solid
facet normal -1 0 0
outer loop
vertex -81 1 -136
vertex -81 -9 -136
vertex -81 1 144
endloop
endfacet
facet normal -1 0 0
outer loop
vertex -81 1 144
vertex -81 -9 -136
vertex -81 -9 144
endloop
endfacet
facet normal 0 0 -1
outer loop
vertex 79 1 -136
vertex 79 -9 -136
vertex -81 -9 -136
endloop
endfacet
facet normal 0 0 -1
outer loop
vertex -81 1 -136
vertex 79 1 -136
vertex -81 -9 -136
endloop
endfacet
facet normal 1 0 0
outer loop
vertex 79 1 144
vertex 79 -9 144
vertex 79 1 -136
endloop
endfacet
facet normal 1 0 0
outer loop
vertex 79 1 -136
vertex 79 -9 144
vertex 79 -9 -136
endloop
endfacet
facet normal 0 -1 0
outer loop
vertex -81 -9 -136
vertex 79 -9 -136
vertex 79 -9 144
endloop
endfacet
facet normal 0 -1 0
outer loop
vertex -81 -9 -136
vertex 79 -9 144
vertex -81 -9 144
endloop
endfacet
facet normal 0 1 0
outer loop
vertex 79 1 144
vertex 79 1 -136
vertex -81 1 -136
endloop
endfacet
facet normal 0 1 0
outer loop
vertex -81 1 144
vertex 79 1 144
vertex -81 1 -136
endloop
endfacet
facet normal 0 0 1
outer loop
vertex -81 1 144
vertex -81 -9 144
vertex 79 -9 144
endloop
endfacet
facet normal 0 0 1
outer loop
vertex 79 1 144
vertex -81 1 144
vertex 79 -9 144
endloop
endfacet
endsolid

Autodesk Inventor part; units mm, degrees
ref_plane "YZ Plane" through (0, 0, 0) normal (1, 0, 0) x (0, 1, 0)
ref_plane "XZ Plane" through (0, 0, 0) normal (0, 1, 0) x (-1, 0, 0)
ref_plane "XY Plane" through (0, 0, 0) normal (0, 0, 1) x (1, 0, 0)
sketch "Sketch1" plane through (0, 0, 0) normal (0, 1, 0) x (-1, 0, 0)
  line L0 (9, 18) -> (-7, 18)
  line L1 (-7, 18) -> (-7, -10)
  line L2 (-7, -10) -> (9, -10)
  line L3 (9, -10) -> (9, 18)
  point P0 (0, 0)
extrude "Extrusion1" add sketch "Sketch1" along normal blind 1
sketch "Sketch2" plane through (0, 1, 0) normal (0, 1, 0) x (1, 0, 0)
  point P0 (0, 0)
scale "Scale1" factors (10, 10, 10) then translate (9, -9, -36) bodies 1
scale "Scale2" factors (10, 10, 10) then translate (9, -9, -36) bodies 1
scale "Scale3" factors (0.1, 0.1, 0.1) then translate (-0.9, 0.9, 3.6) bodies 1
properties part number "caseing"
